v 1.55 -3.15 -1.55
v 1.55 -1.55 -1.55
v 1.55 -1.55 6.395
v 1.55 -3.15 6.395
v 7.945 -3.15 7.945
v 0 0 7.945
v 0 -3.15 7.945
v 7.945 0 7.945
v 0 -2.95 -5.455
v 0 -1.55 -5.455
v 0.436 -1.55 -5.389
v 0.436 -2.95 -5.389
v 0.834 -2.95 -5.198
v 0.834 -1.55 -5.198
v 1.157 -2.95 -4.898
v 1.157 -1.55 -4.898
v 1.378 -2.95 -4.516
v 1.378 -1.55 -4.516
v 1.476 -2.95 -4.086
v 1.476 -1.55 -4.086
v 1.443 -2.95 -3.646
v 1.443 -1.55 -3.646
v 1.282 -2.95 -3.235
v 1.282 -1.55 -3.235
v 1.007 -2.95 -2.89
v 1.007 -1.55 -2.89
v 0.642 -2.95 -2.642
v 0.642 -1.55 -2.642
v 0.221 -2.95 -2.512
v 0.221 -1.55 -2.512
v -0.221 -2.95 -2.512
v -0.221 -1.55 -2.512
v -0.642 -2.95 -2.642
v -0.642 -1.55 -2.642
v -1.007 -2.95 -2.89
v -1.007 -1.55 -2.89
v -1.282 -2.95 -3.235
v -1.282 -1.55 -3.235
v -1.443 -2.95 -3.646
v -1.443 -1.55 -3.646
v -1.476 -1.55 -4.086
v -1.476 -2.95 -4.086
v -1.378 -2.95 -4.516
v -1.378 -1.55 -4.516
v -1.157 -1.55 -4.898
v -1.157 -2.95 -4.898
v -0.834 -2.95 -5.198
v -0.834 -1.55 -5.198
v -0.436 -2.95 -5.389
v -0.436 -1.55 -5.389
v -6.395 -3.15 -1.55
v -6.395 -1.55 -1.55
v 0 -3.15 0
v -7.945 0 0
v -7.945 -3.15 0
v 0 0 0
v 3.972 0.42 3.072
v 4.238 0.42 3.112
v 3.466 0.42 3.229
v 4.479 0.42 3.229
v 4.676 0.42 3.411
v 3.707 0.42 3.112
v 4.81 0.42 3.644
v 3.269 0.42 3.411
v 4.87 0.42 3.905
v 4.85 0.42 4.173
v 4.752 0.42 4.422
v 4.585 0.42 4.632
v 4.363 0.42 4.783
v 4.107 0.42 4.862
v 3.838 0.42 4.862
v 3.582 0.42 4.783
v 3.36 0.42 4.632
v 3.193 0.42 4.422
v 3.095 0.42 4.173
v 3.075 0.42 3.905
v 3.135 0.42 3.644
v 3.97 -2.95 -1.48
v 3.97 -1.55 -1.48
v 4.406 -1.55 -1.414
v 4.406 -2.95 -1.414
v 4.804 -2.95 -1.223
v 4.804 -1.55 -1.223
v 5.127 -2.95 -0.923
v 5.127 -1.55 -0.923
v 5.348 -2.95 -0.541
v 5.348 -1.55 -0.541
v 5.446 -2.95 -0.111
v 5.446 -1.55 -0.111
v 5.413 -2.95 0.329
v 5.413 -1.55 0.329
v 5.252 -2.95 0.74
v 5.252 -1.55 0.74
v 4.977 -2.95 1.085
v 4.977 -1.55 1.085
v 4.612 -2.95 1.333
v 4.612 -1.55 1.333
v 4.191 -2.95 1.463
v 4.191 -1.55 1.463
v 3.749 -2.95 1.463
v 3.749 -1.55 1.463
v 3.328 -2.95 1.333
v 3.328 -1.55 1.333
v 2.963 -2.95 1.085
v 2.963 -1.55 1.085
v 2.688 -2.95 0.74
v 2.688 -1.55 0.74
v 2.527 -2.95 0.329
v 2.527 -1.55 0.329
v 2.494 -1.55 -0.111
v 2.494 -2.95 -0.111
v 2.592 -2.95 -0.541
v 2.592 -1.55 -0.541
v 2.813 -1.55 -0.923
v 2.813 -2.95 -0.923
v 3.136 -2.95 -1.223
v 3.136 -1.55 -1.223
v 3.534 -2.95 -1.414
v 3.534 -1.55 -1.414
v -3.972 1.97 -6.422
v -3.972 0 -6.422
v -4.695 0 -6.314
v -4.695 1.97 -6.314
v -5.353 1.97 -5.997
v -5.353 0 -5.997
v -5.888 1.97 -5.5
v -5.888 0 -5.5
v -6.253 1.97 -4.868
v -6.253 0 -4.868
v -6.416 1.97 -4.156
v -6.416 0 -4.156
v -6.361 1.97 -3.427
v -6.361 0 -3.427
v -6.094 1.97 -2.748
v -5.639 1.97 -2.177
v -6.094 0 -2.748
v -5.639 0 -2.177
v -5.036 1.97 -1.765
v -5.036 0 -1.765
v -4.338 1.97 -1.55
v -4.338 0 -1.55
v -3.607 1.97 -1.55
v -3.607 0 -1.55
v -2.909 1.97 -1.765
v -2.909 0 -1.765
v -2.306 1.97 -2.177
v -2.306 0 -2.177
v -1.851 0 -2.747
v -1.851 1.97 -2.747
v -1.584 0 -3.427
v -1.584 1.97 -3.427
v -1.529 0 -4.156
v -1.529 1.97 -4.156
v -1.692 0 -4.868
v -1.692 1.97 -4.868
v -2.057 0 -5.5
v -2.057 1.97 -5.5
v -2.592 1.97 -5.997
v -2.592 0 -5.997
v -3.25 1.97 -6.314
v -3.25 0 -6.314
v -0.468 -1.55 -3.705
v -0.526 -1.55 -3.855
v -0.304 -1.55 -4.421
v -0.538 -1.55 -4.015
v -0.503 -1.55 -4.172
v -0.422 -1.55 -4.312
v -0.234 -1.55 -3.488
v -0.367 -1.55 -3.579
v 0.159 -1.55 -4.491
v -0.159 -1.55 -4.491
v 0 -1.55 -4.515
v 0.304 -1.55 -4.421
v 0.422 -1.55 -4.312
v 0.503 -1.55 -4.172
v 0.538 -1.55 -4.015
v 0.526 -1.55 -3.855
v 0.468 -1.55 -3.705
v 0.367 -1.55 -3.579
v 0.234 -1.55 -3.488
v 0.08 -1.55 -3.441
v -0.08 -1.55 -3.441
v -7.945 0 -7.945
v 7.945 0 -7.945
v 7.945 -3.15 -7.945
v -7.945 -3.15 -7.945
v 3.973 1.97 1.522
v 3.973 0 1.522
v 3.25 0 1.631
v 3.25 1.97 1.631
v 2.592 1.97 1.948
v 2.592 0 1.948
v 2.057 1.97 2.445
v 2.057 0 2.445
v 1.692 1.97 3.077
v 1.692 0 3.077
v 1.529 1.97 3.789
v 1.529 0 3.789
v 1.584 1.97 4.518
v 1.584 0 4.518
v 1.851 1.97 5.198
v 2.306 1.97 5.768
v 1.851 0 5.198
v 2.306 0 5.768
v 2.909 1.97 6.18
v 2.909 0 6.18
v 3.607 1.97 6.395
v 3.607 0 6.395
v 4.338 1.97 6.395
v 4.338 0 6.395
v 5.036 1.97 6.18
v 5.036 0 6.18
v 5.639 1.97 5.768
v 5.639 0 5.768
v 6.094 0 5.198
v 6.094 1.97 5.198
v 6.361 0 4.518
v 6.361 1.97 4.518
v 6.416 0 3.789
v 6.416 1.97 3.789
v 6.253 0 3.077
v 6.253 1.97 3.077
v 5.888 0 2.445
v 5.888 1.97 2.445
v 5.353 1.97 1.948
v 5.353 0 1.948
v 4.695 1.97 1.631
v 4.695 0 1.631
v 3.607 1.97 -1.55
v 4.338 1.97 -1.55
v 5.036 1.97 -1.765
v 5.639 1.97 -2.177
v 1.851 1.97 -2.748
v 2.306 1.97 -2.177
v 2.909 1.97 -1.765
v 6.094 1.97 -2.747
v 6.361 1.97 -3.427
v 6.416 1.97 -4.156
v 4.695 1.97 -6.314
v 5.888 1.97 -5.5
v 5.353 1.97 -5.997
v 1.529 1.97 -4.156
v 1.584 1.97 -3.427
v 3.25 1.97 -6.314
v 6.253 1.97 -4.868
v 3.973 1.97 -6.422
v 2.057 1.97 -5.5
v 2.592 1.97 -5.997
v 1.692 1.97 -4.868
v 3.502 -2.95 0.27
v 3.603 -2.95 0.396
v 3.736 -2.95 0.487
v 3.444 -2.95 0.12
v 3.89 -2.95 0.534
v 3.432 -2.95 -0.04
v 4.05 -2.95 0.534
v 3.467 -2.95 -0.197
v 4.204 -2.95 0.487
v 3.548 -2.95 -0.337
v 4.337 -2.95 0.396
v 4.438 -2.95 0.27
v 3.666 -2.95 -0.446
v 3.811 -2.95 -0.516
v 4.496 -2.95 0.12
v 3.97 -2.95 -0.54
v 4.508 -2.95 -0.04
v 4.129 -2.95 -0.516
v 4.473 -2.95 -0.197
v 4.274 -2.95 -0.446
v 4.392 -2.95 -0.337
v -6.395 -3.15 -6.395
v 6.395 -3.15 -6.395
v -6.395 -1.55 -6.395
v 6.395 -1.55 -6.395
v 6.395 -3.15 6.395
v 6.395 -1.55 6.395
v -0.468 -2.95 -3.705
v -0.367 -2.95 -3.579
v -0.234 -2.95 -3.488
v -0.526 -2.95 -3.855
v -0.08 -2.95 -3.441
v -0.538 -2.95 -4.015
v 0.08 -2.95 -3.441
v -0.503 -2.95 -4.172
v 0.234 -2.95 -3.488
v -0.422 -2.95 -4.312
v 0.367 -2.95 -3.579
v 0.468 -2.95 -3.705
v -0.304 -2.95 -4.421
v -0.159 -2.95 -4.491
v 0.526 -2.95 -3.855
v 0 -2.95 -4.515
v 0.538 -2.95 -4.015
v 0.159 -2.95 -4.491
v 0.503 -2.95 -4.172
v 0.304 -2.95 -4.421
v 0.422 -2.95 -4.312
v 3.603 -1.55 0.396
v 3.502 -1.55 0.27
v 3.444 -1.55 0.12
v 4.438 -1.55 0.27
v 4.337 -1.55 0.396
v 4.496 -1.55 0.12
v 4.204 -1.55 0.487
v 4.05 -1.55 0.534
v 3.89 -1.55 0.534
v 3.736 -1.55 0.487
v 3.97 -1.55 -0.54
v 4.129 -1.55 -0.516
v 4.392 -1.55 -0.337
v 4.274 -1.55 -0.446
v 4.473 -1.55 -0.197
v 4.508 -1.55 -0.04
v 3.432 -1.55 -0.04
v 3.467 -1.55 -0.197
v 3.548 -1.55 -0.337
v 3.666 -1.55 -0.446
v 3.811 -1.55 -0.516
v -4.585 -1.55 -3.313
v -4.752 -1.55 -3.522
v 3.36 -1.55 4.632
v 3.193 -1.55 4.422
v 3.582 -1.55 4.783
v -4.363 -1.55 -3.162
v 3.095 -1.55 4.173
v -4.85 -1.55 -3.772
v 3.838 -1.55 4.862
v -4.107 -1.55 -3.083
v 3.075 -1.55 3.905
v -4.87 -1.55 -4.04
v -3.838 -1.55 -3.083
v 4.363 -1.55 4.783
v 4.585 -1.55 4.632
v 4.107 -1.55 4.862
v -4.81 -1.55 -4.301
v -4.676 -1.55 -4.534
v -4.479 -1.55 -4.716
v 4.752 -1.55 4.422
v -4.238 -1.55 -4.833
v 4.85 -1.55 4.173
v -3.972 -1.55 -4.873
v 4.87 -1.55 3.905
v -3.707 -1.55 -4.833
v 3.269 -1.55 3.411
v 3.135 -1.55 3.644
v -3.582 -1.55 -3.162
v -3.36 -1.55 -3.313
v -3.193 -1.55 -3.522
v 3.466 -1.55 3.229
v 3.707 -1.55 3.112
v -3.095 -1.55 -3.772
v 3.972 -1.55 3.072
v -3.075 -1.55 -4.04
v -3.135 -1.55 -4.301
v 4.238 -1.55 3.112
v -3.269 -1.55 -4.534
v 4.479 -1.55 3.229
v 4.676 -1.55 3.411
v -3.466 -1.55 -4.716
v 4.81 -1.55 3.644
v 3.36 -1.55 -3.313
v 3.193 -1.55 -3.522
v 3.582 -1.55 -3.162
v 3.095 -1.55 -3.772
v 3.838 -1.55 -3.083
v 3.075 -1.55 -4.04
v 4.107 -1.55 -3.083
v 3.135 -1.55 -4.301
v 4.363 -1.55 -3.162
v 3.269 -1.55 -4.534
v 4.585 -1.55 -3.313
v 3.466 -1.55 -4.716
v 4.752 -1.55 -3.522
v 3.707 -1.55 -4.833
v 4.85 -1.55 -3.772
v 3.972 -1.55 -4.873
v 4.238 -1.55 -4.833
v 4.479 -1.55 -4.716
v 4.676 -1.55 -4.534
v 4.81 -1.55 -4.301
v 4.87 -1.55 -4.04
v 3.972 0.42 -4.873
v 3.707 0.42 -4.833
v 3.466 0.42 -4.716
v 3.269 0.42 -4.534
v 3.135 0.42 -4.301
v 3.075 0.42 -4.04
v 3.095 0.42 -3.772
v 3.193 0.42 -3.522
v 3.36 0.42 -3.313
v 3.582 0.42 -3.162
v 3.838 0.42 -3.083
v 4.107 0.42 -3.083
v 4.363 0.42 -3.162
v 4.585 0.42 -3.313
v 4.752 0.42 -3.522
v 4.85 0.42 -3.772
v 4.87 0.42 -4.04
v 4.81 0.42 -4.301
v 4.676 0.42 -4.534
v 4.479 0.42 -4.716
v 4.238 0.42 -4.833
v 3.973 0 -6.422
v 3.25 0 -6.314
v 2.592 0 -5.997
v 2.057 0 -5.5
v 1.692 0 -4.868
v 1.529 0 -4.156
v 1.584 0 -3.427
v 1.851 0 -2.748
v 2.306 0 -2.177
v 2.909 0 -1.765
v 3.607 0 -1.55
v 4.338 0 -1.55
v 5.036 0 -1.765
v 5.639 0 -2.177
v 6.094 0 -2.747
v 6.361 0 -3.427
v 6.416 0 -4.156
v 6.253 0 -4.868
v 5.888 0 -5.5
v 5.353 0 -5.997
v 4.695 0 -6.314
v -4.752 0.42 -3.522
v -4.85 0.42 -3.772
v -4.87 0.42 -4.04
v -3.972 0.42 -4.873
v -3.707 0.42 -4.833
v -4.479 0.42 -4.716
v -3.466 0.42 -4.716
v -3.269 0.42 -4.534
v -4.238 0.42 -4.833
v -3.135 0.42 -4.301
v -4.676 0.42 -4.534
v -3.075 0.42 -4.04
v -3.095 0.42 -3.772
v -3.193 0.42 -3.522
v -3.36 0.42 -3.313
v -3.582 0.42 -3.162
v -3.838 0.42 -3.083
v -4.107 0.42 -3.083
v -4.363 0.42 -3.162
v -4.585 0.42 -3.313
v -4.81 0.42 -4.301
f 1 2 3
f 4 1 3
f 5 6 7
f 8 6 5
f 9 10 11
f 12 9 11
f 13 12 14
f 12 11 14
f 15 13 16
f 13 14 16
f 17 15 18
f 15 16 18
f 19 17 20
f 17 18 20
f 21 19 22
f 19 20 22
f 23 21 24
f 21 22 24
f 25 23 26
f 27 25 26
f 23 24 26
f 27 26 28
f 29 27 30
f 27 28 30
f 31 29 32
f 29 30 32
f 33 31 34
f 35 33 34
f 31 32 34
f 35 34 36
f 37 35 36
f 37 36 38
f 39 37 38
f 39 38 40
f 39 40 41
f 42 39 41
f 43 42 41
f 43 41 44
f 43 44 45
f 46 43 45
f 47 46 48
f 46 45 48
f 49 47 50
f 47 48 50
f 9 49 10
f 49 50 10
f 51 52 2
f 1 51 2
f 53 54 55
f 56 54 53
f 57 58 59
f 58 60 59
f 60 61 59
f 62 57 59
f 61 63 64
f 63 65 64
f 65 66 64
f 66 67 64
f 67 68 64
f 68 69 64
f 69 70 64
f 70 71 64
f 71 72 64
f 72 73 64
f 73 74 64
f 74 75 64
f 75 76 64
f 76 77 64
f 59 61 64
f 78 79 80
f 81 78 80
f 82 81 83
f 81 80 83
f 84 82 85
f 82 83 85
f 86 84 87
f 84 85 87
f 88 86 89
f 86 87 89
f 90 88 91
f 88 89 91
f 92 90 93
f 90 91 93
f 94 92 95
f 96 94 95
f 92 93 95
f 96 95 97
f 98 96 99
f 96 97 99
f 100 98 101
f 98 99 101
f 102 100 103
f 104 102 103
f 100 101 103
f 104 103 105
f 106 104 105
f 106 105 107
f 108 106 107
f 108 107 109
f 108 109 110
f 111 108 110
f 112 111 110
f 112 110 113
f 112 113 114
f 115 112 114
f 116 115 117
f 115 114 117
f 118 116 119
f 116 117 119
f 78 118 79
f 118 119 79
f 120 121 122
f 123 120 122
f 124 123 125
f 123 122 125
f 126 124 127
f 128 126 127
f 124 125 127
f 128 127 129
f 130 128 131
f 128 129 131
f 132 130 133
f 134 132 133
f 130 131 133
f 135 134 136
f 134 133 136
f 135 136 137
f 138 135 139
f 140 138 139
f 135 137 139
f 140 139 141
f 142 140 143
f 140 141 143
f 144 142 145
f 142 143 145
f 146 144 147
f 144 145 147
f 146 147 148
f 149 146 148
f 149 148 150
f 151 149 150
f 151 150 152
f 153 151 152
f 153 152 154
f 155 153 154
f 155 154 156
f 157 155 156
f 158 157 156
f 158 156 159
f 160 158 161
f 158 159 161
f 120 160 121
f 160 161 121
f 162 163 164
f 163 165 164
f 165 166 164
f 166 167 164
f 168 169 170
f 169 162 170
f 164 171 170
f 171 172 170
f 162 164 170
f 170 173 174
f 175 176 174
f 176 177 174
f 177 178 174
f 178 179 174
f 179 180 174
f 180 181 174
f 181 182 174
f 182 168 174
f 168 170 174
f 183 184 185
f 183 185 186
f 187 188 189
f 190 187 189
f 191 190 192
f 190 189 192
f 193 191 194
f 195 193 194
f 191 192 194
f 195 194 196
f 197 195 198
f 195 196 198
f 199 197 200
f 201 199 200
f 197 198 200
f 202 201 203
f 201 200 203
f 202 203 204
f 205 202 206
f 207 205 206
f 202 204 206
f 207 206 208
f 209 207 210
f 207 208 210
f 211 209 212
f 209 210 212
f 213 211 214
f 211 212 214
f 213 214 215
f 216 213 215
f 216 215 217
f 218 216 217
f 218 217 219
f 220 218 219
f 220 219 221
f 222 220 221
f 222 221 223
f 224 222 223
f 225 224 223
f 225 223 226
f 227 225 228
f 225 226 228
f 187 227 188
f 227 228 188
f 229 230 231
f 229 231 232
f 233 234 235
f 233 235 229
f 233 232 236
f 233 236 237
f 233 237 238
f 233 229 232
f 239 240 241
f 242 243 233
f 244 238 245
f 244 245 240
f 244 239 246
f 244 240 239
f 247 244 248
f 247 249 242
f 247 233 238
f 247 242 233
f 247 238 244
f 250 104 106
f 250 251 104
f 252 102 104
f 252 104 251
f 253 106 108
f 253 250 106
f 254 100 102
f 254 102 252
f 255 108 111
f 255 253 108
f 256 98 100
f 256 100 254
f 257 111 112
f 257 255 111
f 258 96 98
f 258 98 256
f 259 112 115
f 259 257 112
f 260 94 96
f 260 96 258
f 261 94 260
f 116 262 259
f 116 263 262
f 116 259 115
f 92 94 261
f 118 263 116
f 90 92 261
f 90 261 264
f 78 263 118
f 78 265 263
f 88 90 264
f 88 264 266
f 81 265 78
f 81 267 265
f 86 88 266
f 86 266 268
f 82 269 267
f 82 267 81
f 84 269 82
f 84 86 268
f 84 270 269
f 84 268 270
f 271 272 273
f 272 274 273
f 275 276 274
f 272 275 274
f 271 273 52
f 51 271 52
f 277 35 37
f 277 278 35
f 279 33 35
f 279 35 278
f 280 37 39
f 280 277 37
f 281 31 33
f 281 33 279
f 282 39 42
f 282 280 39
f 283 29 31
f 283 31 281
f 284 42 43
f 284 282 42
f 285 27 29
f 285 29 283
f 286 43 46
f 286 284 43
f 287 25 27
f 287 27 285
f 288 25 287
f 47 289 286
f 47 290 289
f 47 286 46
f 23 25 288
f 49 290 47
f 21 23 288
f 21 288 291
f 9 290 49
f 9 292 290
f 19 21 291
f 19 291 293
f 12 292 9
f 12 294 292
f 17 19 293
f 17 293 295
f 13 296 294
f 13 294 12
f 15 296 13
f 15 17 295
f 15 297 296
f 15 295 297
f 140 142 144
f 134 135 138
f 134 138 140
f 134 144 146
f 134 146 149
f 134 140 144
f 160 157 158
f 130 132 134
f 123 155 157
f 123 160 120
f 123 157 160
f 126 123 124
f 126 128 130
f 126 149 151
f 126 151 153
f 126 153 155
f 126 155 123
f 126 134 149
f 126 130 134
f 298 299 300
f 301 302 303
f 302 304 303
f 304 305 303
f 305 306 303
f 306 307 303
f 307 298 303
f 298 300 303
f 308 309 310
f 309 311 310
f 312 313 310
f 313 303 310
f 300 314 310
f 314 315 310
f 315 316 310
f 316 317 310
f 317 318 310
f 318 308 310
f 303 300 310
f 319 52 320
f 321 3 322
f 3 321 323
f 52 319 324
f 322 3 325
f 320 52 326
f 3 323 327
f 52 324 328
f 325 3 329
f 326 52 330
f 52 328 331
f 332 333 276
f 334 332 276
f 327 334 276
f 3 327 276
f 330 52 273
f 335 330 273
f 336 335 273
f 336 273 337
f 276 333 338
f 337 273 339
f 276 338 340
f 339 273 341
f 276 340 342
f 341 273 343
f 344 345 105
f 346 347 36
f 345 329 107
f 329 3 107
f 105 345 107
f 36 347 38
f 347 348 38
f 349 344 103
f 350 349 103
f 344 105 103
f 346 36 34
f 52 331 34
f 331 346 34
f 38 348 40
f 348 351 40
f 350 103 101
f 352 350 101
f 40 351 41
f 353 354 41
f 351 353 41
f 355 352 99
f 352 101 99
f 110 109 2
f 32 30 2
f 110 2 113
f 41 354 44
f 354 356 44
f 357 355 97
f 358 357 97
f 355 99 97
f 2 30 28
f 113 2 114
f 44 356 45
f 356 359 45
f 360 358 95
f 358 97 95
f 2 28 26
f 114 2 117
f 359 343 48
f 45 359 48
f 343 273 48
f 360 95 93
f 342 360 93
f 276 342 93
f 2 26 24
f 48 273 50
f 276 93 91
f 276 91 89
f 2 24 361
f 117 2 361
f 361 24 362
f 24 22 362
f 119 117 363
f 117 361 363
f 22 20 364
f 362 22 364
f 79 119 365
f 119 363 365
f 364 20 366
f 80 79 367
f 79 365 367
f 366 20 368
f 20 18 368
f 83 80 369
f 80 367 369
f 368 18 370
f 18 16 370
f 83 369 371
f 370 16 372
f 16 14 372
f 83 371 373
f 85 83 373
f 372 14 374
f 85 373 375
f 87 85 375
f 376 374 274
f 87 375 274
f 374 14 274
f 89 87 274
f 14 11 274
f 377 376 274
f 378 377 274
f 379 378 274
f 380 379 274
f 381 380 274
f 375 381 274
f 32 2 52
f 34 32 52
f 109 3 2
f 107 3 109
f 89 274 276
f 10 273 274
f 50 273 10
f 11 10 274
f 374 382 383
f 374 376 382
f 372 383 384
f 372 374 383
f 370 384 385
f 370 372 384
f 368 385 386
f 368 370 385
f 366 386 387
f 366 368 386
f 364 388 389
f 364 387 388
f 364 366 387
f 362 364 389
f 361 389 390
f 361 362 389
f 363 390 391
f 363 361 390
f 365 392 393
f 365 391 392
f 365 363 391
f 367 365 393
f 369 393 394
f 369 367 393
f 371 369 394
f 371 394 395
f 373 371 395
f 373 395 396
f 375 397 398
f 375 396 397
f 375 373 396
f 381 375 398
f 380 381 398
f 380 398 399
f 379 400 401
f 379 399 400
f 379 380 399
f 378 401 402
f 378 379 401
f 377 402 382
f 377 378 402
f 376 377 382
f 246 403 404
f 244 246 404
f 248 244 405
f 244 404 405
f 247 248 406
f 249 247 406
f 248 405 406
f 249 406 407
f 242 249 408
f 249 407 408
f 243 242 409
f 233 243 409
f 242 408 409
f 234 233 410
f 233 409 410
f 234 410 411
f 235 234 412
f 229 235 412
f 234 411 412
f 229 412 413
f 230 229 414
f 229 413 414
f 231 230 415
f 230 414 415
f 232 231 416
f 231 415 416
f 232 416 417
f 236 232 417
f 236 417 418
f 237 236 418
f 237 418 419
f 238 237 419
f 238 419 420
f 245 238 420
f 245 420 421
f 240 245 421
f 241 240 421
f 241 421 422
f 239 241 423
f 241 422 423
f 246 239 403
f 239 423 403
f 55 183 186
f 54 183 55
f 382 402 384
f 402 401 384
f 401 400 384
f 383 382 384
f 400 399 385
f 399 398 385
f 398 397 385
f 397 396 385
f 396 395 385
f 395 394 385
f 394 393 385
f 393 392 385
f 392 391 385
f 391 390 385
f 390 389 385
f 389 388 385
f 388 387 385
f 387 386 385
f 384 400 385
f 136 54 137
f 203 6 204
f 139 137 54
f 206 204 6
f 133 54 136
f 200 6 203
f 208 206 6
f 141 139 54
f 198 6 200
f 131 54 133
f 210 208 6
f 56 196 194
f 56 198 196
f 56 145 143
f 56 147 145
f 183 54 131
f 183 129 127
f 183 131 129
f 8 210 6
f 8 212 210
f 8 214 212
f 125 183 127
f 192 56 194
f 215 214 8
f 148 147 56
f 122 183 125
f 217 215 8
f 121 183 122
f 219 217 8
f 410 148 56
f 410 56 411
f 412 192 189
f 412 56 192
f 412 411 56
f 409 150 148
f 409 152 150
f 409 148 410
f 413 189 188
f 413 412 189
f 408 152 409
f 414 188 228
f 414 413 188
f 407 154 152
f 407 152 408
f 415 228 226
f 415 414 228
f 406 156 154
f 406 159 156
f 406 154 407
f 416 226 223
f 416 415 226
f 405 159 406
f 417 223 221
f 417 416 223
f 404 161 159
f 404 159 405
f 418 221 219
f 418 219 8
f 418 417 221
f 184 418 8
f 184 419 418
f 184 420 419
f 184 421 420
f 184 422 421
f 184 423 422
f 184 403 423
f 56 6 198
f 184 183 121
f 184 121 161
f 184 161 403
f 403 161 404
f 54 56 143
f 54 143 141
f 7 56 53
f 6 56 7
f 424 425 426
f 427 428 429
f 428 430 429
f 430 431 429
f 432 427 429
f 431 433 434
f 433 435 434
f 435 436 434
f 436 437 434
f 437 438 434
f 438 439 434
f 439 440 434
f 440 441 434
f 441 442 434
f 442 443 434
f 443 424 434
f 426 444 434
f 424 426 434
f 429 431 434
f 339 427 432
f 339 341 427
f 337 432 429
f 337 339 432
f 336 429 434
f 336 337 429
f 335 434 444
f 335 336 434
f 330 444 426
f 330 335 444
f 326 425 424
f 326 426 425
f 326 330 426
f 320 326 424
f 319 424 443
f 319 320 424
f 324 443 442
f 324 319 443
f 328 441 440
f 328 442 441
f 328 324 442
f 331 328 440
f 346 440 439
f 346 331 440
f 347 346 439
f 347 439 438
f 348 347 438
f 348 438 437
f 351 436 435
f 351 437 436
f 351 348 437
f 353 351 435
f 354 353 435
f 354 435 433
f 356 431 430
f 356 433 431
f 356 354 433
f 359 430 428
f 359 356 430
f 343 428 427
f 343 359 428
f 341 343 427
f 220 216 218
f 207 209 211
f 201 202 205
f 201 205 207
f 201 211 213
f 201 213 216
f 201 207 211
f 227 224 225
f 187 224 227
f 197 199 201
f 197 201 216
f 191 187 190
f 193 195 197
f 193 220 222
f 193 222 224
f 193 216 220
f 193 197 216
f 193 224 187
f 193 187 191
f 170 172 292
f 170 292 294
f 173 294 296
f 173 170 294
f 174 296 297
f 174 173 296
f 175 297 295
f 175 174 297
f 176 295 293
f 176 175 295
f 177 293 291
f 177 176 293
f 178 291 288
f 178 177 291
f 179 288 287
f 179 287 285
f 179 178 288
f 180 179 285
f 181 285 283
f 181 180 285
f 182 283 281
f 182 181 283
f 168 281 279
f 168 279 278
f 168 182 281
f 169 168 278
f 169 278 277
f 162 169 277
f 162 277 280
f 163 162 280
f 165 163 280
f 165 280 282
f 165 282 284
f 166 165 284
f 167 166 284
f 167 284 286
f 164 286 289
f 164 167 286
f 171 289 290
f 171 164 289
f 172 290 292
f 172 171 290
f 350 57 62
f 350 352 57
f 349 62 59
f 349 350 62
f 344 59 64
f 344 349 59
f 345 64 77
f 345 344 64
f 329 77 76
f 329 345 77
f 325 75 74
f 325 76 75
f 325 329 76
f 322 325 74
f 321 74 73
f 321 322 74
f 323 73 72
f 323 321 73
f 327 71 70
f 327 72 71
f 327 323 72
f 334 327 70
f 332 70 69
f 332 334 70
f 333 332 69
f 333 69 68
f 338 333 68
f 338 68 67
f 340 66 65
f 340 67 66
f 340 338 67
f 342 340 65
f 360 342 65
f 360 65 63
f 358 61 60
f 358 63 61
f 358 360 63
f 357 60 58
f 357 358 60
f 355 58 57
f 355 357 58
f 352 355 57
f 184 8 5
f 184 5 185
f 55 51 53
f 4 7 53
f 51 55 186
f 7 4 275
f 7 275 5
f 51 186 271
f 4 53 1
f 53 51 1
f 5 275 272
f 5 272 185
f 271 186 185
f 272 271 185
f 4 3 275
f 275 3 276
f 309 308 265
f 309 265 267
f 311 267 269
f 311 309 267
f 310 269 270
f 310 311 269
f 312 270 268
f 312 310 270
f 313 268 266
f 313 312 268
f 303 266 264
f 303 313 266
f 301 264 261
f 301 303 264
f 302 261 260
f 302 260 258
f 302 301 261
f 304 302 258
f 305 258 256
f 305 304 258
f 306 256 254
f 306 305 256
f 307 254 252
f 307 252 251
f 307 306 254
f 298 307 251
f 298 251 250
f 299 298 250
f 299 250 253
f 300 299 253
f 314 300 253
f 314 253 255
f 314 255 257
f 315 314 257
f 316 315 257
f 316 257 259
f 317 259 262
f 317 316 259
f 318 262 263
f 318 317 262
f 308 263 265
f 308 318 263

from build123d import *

# Parameters (mm, degrees)
BOSS_EXTRUDE1_DEPTH = 3.15
SKETCH2_R           = 2.45
BOSS_EXTRUDE2_DEPTH = 1.97
SHELL1_T            = -1.55
SKETCH3_R           = 1.48
SKETCH3_R_2         = 0.54
BOSS_EXTRUDE3_DEPTH = 1.4


with BuildPart() as part:
    # Sketch1 → Boss-Extrude1 (new body)
    with BuildSketch(Plane(origin=(0, 0, 0), x_dir=(1, 0, 0), z_dir=(0, 1, 0))):
        Polygon((0, 0), (0, -7.945), (7.945, -7.945), (7.945, 7.945), (-7.945, 7.945), (-7.945, 0), align=None)
    extrude(amount=-BOSS_EXTRUDE1_DEPTH)

    # Sketch2 → Boss-Extrude2 (add)
    with BuildSketch(Plane(origin=(0, 0, 0), x_dir=(1, 0, 0), z_dir=(0, 1, 0))):
        with Locations(Location((3.9725, 3.9725, 0), (0, 0, 90))):
            Circle(SKETCH2_R)
        with Locations(Location((3.9725, -3.9725, 0), (0, 0, 90))):
            Circle(SKETCH2_R)
        with Locations(Location((-3.9725, 3.9725, 0), (0, 0, 90))):
            Circle(SKETCH2_R)
    extrude(amount=BOSS_EXTRUDE2_DEPTH)

    # Shell1
    shell1_openings = [part.faces().sort_by_distance(p)[0] for p in [
        (1.324166667, -3.15, -1.324166667),
    ]]
    offset(amount=SHELL1_T, openings=shell1_openings, kind=Kind.INTERSECTION)

    # Sketch3 → Boss-Extrude3 (add)
    # profile 1 of 2: a face of its own
    with BuildSketch(Plane.XZ.offset(1.55)):
        with Locations(Location((0, -3.975, 0), (0, 0, 270))):
            Circle(SKETCH3_R)
        with Locations(Location((0, -3.975, 0), (0, 0, 270))):
            Circle(SKETCH3_R_2, mode=Mode.SUBTRACT)
    # profile 2 of 2: a face of its own
    with BuildSketch(Plane.XZ.offset(1.55)):
        with Locations(Location((3.97, 0, 0), (0, 0, 270))):
            Circle(SKETCH3_R)
        with Locations(Location((3.97, 0, 0), (0, 0, 270))):
            Circle(SKETCH3_R_2, mode=Mode.SUBTRACT)
    extrude(amount=BOSS_EXTRUDE3_DEPTH)


solid = part.part
